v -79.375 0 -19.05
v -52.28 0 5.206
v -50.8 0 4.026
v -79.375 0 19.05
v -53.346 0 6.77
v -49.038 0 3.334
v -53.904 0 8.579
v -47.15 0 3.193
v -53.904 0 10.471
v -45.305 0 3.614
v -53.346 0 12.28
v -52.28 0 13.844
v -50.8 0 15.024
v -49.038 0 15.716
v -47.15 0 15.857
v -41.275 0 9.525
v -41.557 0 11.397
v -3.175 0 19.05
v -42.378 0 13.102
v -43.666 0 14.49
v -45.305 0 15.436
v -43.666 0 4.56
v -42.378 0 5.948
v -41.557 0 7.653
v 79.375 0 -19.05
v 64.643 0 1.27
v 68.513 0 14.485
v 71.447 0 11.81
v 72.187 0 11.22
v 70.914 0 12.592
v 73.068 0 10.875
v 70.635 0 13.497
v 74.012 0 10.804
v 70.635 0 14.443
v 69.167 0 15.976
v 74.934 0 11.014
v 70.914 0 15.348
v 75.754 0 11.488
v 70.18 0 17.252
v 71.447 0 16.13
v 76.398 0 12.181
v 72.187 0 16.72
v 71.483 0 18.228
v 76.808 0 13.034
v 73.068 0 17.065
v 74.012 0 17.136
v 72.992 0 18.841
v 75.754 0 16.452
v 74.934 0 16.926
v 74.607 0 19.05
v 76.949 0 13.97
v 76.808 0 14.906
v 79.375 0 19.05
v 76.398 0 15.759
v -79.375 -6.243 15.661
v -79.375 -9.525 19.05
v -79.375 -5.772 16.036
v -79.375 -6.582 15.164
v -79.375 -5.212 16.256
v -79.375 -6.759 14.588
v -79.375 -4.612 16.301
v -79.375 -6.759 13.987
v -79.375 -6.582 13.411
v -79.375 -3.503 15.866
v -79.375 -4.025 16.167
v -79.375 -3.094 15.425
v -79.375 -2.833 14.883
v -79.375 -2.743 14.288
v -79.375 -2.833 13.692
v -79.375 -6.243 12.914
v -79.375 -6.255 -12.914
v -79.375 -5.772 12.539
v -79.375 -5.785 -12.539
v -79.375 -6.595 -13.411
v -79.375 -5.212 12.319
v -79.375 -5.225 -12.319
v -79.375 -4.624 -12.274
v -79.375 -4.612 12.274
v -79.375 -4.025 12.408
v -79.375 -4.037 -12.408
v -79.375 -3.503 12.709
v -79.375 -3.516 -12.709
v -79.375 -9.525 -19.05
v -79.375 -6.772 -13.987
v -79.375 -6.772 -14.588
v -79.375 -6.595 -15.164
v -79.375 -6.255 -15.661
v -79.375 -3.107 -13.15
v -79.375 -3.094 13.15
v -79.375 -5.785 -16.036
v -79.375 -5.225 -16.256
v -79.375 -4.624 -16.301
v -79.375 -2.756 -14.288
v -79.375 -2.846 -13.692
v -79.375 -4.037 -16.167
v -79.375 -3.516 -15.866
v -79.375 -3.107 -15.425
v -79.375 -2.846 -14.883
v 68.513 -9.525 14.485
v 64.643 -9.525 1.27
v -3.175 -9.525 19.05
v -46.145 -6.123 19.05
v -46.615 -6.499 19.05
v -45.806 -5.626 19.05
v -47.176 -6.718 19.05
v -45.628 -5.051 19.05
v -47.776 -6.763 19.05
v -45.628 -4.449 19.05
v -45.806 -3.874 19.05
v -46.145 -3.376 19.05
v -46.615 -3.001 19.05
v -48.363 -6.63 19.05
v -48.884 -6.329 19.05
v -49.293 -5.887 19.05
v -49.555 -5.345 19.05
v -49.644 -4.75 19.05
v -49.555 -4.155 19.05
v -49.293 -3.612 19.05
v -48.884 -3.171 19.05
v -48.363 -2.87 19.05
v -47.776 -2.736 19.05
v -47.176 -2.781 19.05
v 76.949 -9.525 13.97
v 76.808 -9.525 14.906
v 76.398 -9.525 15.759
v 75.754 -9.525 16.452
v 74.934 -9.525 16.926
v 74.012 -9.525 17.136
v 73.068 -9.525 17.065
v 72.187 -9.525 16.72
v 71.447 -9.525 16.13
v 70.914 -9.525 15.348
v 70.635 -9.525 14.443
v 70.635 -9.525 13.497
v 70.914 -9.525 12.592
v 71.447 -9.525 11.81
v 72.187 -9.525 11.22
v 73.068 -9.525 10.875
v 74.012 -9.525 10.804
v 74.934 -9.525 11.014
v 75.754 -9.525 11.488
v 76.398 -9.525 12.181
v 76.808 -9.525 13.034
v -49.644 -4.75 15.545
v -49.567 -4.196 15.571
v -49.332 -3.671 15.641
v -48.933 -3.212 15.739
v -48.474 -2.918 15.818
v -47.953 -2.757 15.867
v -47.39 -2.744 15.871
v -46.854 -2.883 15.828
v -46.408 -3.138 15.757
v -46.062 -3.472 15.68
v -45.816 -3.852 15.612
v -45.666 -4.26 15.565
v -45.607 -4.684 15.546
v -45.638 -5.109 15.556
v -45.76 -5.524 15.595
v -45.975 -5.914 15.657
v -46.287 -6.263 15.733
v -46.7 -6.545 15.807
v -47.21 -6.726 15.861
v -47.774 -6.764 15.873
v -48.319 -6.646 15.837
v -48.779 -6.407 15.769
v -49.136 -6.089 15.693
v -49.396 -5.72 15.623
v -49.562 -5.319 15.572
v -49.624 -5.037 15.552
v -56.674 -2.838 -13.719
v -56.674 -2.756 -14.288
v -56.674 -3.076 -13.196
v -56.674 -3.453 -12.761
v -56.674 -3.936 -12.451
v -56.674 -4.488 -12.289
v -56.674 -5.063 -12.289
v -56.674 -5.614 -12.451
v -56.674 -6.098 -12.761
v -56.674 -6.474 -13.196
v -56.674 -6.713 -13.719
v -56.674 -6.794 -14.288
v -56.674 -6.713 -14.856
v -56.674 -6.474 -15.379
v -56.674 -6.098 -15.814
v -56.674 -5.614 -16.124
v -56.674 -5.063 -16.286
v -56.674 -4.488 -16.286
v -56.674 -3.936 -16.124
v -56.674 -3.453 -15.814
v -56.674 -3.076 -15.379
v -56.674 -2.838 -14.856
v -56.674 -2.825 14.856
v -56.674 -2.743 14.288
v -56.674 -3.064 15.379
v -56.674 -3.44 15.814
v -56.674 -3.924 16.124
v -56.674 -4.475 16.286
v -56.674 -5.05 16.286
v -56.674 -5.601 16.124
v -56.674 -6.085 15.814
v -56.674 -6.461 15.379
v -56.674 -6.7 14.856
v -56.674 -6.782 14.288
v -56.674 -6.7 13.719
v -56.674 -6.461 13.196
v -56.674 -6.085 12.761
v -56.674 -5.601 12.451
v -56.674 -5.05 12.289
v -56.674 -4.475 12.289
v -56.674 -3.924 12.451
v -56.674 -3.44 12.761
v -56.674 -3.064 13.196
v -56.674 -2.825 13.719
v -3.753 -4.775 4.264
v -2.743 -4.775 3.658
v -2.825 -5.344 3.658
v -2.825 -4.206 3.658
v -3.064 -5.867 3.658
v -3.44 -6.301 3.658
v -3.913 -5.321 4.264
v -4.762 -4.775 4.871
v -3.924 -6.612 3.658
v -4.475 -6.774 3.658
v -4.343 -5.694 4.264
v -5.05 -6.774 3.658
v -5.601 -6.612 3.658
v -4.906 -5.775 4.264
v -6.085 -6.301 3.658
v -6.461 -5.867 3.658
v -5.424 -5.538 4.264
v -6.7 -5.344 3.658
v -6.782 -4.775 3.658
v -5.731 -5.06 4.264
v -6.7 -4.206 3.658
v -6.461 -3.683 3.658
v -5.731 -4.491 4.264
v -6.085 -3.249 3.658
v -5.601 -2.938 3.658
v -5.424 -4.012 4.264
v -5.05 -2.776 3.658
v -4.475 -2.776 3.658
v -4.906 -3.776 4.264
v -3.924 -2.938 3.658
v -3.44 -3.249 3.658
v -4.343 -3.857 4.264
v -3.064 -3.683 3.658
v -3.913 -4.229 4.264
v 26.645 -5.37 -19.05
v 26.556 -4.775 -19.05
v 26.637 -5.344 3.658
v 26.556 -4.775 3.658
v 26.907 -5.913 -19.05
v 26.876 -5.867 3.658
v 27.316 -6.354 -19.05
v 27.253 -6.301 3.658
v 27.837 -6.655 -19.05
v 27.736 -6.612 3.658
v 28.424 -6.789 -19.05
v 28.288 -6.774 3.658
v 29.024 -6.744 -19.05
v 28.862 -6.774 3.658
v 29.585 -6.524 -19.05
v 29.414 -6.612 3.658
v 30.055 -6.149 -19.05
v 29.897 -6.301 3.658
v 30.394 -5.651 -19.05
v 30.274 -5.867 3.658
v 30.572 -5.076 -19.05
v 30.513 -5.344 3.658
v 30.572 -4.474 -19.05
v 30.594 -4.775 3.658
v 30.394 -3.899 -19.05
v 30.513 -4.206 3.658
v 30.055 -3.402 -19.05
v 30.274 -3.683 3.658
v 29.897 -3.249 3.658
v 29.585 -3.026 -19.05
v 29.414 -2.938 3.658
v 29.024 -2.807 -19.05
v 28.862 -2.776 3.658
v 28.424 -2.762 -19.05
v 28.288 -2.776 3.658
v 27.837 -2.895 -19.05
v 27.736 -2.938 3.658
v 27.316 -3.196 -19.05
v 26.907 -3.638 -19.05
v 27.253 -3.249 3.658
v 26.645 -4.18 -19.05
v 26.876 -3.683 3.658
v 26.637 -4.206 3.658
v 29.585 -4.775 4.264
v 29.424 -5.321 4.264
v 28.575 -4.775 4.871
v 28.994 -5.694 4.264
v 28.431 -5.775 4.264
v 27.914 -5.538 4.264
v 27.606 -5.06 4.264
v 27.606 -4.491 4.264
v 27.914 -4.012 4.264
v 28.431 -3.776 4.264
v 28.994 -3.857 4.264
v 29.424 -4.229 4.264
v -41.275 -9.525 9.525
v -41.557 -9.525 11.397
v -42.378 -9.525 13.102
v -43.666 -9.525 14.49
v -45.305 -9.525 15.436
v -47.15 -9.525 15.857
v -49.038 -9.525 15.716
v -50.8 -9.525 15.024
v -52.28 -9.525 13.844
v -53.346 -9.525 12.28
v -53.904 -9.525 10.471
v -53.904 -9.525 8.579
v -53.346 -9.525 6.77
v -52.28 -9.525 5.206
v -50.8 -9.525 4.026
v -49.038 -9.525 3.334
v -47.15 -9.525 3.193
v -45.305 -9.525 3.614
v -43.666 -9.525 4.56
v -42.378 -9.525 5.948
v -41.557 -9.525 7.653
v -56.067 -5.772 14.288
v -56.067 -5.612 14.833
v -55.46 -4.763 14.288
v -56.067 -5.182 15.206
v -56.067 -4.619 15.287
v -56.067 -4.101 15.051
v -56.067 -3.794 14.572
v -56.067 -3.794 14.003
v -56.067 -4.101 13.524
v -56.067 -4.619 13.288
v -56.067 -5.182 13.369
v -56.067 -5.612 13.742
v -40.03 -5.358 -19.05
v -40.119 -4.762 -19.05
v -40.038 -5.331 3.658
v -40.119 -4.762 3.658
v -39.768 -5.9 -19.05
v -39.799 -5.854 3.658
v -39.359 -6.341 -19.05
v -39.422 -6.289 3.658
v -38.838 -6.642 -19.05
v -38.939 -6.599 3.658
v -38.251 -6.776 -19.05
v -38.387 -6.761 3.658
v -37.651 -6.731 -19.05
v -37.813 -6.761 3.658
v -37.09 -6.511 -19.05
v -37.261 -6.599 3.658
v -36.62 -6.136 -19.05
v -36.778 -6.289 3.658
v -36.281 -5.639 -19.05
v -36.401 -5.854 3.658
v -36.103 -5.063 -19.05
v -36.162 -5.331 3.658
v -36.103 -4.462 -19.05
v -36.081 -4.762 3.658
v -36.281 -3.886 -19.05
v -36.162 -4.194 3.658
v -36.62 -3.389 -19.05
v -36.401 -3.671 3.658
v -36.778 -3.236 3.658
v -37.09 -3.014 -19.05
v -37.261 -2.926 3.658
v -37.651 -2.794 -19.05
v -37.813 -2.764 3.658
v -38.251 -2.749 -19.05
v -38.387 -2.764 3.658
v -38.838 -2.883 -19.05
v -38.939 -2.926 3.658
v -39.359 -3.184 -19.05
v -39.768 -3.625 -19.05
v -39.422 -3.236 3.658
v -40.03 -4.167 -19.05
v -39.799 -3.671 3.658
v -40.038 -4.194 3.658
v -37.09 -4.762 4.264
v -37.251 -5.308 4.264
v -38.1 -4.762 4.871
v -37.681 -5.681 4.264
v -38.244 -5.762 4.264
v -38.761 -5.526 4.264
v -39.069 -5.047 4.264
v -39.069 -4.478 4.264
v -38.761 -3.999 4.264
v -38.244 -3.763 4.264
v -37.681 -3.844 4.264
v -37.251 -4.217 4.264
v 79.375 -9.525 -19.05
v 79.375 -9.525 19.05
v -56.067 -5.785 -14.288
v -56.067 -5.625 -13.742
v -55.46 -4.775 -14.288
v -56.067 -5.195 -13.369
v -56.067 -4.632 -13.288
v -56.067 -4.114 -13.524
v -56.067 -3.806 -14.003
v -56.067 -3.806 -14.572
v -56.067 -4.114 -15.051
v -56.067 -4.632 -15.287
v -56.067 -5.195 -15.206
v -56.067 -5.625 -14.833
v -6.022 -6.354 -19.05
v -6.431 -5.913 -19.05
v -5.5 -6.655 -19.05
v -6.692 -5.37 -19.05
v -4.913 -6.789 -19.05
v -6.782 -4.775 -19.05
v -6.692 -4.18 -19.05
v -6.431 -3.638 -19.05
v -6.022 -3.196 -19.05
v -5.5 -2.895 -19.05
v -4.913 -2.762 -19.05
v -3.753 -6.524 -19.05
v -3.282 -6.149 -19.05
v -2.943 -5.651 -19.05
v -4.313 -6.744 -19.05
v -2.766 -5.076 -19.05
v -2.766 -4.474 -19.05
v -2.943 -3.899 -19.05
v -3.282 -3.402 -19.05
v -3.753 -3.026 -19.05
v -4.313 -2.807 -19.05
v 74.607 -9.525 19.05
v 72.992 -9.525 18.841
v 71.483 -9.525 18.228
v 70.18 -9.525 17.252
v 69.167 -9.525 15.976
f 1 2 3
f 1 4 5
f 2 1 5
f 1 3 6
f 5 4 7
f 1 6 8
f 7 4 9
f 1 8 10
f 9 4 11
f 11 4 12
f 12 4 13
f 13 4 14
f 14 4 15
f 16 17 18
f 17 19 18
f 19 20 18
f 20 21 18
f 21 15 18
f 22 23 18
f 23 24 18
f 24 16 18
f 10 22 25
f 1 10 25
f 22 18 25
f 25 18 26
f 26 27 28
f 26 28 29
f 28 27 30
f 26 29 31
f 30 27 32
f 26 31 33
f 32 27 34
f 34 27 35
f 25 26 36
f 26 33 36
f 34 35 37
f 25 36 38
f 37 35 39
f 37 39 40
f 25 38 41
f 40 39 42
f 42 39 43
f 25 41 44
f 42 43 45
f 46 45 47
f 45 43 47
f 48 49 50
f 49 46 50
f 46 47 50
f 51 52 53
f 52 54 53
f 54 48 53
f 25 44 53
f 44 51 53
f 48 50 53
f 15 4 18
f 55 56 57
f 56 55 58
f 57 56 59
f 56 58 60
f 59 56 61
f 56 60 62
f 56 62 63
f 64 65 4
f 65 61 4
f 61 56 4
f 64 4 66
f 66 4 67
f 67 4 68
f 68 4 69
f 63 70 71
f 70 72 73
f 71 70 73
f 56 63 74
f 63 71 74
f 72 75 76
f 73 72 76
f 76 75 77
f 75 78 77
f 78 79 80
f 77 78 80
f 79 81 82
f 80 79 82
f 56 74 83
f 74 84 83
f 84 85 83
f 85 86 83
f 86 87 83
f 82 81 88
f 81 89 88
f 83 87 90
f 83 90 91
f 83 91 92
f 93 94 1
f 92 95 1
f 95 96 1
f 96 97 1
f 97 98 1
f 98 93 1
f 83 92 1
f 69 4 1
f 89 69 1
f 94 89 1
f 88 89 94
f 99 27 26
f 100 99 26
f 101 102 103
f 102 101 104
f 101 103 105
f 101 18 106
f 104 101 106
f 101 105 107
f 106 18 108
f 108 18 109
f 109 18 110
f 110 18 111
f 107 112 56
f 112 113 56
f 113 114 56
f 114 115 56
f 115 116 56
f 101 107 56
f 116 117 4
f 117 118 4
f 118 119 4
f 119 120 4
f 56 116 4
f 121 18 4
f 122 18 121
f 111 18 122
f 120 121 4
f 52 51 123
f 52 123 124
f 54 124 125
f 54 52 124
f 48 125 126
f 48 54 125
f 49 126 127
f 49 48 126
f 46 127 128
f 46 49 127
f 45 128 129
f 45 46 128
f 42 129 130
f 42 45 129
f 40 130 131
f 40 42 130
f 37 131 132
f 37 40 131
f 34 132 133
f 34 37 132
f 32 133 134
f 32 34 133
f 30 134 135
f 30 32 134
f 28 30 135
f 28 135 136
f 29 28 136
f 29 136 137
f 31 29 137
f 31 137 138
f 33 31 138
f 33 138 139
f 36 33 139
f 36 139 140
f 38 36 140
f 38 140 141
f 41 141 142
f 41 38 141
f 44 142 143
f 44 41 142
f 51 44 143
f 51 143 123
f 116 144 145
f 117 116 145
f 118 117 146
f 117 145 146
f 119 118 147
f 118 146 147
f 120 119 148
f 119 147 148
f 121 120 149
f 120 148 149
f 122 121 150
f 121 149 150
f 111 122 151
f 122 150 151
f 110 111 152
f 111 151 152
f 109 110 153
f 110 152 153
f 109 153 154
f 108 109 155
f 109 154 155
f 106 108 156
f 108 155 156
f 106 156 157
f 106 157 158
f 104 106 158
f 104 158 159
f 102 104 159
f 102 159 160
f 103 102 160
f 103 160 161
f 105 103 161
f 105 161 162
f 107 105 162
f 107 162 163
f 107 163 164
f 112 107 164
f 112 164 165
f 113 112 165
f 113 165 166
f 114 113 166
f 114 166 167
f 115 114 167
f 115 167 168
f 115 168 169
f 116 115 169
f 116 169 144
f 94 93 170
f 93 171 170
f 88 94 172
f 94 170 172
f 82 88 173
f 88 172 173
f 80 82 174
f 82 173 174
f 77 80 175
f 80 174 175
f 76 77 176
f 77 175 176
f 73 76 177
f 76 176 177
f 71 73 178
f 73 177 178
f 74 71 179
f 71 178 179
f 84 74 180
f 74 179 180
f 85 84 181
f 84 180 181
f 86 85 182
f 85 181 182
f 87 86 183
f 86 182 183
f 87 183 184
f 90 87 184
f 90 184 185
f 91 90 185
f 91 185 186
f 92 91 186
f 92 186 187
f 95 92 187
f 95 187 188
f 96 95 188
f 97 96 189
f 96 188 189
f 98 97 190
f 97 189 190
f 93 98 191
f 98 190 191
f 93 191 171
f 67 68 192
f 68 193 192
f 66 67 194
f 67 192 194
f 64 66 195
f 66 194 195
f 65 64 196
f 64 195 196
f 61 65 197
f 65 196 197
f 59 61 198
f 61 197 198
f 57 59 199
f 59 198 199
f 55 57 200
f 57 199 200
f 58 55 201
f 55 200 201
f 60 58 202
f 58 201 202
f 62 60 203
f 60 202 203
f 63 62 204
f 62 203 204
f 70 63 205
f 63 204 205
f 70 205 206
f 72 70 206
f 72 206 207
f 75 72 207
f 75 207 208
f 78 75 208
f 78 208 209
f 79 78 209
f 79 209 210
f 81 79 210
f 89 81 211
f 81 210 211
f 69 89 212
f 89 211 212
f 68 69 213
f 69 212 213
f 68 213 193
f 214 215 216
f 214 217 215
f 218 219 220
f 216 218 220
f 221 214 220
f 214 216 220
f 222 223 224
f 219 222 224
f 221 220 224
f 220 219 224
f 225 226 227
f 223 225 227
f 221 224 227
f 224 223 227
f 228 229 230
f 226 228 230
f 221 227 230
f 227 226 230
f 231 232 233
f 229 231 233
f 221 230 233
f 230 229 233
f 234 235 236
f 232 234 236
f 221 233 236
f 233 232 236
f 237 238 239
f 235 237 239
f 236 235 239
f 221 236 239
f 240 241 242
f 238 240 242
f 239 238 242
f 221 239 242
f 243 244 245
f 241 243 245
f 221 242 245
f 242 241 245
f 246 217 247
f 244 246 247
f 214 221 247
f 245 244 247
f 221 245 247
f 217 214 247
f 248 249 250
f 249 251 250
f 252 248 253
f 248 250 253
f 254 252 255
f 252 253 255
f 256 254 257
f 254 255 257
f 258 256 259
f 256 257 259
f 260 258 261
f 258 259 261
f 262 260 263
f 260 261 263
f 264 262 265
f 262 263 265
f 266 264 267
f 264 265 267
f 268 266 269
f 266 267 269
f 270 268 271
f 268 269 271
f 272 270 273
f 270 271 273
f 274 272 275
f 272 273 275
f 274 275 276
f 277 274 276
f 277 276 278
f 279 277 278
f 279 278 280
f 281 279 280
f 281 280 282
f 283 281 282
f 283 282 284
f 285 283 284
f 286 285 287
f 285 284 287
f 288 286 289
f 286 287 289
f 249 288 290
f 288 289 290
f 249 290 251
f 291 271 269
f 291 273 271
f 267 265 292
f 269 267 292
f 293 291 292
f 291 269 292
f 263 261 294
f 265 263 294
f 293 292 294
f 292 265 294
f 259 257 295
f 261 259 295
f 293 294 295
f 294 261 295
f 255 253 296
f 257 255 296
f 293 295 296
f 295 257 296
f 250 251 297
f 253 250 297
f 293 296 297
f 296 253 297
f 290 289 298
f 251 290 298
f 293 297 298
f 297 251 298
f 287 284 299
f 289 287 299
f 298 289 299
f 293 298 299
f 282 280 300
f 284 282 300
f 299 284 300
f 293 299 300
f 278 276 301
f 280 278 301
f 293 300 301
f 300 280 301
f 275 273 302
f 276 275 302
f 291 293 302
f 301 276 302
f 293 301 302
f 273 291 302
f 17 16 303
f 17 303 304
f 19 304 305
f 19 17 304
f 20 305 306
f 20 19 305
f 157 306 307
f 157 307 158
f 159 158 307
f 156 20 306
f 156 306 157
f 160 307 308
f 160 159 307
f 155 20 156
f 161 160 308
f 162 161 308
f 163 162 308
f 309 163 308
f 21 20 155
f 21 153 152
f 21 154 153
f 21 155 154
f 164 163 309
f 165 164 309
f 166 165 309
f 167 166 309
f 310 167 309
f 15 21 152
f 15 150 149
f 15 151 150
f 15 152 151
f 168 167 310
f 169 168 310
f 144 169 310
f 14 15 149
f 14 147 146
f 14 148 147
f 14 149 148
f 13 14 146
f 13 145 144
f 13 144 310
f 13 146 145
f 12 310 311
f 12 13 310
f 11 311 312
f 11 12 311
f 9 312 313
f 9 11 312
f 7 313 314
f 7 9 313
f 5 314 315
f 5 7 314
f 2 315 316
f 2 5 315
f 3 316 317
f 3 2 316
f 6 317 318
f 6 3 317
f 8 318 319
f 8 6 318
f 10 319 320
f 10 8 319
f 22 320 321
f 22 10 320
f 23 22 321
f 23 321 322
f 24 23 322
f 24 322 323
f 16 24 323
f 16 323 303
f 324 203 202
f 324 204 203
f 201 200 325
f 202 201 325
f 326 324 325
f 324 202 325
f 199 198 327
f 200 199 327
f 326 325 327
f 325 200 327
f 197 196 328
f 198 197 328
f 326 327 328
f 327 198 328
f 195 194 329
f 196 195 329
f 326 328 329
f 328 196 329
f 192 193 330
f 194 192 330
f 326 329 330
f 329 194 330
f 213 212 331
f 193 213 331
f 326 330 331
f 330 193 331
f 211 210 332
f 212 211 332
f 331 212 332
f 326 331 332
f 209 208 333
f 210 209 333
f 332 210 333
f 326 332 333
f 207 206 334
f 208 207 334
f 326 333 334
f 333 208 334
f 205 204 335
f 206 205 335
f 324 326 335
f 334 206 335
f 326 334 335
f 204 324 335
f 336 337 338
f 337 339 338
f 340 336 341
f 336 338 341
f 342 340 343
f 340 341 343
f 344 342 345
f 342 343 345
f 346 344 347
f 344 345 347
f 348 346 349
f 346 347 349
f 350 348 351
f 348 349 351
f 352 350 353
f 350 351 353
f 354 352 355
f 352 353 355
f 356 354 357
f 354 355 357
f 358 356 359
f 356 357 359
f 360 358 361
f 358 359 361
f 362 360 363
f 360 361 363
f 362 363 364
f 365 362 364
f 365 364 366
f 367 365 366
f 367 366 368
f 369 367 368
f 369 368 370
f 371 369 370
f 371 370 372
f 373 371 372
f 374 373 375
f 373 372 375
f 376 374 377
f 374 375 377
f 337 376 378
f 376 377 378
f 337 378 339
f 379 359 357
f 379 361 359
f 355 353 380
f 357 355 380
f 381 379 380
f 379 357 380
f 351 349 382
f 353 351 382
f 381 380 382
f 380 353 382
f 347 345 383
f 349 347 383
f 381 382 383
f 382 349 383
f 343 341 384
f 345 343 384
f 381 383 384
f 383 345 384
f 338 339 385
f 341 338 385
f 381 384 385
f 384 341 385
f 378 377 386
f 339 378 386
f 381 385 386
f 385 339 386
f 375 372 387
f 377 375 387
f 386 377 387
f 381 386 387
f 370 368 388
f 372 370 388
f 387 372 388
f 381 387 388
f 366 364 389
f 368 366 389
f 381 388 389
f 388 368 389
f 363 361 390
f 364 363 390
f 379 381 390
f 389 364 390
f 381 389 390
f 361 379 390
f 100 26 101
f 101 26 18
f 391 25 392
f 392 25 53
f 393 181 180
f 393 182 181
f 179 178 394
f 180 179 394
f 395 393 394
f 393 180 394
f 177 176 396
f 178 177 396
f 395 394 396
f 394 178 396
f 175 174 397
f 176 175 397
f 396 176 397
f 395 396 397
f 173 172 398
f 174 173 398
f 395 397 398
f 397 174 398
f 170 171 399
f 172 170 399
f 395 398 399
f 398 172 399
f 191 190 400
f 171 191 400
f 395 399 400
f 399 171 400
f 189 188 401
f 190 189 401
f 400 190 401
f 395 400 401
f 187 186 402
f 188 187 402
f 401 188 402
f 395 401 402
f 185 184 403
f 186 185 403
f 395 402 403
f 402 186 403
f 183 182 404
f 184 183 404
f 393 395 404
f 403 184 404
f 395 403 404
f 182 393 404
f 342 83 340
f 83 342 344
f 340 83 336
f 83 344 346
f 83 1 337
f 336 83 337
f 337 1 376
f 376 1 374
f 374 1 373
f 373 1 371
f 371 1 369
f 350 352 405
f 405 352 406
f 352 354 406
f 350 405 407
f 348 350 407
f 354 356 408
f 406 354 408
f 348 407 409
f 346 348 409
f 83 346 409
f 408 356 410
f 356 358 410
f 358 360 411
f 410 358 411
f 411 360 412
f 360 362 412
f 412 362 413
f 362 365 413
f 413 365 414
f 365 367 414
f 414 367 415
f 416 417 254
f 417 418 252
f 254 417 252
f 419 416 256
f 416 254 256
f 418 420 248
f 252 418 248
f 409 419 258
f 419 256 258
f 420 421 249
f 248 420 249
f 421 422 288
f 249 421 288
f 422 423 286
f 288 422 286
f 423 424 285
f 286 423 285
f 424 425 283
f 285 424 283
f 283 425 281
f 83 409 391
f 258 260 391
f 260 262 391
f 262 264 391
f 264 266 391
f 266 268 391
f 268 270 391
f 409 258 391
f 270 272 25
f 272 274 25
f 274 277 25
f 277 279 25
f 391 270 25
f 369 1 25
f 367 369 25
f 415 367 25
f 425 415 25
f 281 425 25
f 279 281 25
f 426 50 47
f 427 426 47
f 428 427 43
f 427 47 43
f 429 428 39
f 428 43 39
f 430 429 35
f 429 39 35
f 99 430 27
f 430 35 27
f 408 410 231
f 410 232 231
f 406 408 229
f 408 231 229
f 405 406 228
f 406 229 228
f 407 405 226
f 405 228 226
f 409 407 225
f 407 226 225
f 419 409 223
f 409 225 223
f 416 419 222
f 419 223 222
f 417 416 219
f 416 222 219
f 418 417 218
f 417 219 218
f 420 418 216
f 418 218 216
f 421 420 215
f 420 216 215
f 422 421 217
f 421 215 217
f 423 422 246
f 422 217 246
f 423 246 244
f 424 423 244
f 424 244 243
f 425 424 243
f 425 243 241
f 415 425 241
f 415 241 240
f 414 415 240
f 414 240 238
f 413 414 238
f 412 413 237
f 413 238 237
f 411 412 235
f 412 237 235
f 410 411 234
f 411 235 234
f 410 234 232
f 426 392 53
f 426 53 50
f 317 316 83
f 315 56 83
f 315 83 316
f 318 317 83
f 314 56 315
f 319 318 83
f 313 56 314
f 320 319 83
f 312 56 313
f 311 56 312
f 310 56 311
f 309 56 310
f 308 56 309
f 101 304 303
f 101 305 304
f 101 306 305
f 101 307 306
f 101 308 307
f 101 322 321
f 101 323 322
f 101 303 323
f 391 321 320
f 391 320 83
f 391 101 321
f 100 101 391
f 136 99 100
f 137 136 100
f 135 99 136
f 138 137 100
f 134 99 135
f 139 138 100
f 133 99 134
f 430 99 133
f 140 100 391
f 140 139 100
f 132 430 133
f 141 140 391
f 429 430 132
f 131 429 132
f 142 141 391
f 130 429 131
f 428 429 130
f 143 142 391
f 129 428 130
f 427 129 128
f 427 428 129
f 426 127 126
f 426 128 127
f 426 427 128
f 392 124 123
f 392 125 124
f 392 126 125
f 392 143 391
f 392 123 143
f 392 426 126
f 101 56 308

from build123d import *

# Parameters (mm, degrees)
F0_R     = 6.35
F0_R_2   = 3.175
F1_DEPTH = 9.525
F3_D     = 4.0386
F3_DEPTH = 22.70125
F3_TIP   = 1.213317848
F5_D     = 4.0386
F5_DEPTH = 11.90625
F5_TIP   = 1.213317848
F7_D     = 4.0386
F7_DEPTH = 22.7076
F7_TIP   = 1.213317848


with BuildPart() as f1:
    # F0 (on Front) → F1 (new body)
    with BuildSketch(Plane.XZ):
        with BuildLine():
            Line((-3.175, 19.05), (-79.375, 19.05))
            Line((-79.375, 19.05), (-79.375, -19.05))
            Line((-79.375, -19.05), (79.375, -19.05))
            Line((79.375, -19.05), (79.375, 19.05))
            Line((79.375, 19.05), (74.6070611226, 19.05))
            ThreePointArc((74.6070611226, 19.05), (70.7998475457, 17.7820886237), (68.513014884, 14.4846849699))
            Line((68.513014884, 14.4846849699), (64.643, 1.27))
            Line((64.643, 1.27), (-3.175, 19.05))
        make_face()
        with Locations((-47.625, 9.525)):
            Circle(F0_R, mode=Mode.SUBTRACT)
        with Locations((73.7743, 13.97)):
            Circle(F0_R_2, mode=Mode.SUBTRACT)
    extrude(amount=F1_DEPTH)

    # F3
    with Locations(Plane(origin=(-79.375, 0, 0), x_dir=(0, -1, 0), z_dir=(-1, 0, 0))):
        with Locations((4.7625112989, 14.2875), (4.7751887011, -14.2875)):
            Hole(F3_D / 2, depth=F3_DEPTH)
            with Locations((0, 0, -(F3_DEPTH + F3_TIP / 2))):  # 118° drill point
                Cone(0, F3_D / 2, F3_TIP, mode=Mode.SUBTRACT)

    # F5
    with Locations(Plane.XY.offset(19.05)):
        with Locations((-47.625, -4.7498)):
            Hole(F5_D / 2, depth=F5_DEPTH)
            with Locations((0, 0, -(F5_DEPTH + F5_TIP / 2))):  # 118° drill point
                Cone(0, F5_D / 2, F5_TIP, mode=Mode.SUBTRACT)

    # F7
    with Locations(Plane(origin=(0, 0, -19.05), x_dir=(1, 0, 0), z_dir=(0, 0, -1))):
        with Locations((-38.1, 4.7625), (-4.7625, 4.7752), (28.575, 4.7752)):
            Hole(F7_D / 2, depth=F7_DEPTH)
            with Locations((0, 0, -(F7_DEPTH + F7_TIP / 2))):  # 118° drill point
                Cone(0, F7_D / 2, F7_TIP, mode=Mode.SUBTRACT)


solid = f1.part
